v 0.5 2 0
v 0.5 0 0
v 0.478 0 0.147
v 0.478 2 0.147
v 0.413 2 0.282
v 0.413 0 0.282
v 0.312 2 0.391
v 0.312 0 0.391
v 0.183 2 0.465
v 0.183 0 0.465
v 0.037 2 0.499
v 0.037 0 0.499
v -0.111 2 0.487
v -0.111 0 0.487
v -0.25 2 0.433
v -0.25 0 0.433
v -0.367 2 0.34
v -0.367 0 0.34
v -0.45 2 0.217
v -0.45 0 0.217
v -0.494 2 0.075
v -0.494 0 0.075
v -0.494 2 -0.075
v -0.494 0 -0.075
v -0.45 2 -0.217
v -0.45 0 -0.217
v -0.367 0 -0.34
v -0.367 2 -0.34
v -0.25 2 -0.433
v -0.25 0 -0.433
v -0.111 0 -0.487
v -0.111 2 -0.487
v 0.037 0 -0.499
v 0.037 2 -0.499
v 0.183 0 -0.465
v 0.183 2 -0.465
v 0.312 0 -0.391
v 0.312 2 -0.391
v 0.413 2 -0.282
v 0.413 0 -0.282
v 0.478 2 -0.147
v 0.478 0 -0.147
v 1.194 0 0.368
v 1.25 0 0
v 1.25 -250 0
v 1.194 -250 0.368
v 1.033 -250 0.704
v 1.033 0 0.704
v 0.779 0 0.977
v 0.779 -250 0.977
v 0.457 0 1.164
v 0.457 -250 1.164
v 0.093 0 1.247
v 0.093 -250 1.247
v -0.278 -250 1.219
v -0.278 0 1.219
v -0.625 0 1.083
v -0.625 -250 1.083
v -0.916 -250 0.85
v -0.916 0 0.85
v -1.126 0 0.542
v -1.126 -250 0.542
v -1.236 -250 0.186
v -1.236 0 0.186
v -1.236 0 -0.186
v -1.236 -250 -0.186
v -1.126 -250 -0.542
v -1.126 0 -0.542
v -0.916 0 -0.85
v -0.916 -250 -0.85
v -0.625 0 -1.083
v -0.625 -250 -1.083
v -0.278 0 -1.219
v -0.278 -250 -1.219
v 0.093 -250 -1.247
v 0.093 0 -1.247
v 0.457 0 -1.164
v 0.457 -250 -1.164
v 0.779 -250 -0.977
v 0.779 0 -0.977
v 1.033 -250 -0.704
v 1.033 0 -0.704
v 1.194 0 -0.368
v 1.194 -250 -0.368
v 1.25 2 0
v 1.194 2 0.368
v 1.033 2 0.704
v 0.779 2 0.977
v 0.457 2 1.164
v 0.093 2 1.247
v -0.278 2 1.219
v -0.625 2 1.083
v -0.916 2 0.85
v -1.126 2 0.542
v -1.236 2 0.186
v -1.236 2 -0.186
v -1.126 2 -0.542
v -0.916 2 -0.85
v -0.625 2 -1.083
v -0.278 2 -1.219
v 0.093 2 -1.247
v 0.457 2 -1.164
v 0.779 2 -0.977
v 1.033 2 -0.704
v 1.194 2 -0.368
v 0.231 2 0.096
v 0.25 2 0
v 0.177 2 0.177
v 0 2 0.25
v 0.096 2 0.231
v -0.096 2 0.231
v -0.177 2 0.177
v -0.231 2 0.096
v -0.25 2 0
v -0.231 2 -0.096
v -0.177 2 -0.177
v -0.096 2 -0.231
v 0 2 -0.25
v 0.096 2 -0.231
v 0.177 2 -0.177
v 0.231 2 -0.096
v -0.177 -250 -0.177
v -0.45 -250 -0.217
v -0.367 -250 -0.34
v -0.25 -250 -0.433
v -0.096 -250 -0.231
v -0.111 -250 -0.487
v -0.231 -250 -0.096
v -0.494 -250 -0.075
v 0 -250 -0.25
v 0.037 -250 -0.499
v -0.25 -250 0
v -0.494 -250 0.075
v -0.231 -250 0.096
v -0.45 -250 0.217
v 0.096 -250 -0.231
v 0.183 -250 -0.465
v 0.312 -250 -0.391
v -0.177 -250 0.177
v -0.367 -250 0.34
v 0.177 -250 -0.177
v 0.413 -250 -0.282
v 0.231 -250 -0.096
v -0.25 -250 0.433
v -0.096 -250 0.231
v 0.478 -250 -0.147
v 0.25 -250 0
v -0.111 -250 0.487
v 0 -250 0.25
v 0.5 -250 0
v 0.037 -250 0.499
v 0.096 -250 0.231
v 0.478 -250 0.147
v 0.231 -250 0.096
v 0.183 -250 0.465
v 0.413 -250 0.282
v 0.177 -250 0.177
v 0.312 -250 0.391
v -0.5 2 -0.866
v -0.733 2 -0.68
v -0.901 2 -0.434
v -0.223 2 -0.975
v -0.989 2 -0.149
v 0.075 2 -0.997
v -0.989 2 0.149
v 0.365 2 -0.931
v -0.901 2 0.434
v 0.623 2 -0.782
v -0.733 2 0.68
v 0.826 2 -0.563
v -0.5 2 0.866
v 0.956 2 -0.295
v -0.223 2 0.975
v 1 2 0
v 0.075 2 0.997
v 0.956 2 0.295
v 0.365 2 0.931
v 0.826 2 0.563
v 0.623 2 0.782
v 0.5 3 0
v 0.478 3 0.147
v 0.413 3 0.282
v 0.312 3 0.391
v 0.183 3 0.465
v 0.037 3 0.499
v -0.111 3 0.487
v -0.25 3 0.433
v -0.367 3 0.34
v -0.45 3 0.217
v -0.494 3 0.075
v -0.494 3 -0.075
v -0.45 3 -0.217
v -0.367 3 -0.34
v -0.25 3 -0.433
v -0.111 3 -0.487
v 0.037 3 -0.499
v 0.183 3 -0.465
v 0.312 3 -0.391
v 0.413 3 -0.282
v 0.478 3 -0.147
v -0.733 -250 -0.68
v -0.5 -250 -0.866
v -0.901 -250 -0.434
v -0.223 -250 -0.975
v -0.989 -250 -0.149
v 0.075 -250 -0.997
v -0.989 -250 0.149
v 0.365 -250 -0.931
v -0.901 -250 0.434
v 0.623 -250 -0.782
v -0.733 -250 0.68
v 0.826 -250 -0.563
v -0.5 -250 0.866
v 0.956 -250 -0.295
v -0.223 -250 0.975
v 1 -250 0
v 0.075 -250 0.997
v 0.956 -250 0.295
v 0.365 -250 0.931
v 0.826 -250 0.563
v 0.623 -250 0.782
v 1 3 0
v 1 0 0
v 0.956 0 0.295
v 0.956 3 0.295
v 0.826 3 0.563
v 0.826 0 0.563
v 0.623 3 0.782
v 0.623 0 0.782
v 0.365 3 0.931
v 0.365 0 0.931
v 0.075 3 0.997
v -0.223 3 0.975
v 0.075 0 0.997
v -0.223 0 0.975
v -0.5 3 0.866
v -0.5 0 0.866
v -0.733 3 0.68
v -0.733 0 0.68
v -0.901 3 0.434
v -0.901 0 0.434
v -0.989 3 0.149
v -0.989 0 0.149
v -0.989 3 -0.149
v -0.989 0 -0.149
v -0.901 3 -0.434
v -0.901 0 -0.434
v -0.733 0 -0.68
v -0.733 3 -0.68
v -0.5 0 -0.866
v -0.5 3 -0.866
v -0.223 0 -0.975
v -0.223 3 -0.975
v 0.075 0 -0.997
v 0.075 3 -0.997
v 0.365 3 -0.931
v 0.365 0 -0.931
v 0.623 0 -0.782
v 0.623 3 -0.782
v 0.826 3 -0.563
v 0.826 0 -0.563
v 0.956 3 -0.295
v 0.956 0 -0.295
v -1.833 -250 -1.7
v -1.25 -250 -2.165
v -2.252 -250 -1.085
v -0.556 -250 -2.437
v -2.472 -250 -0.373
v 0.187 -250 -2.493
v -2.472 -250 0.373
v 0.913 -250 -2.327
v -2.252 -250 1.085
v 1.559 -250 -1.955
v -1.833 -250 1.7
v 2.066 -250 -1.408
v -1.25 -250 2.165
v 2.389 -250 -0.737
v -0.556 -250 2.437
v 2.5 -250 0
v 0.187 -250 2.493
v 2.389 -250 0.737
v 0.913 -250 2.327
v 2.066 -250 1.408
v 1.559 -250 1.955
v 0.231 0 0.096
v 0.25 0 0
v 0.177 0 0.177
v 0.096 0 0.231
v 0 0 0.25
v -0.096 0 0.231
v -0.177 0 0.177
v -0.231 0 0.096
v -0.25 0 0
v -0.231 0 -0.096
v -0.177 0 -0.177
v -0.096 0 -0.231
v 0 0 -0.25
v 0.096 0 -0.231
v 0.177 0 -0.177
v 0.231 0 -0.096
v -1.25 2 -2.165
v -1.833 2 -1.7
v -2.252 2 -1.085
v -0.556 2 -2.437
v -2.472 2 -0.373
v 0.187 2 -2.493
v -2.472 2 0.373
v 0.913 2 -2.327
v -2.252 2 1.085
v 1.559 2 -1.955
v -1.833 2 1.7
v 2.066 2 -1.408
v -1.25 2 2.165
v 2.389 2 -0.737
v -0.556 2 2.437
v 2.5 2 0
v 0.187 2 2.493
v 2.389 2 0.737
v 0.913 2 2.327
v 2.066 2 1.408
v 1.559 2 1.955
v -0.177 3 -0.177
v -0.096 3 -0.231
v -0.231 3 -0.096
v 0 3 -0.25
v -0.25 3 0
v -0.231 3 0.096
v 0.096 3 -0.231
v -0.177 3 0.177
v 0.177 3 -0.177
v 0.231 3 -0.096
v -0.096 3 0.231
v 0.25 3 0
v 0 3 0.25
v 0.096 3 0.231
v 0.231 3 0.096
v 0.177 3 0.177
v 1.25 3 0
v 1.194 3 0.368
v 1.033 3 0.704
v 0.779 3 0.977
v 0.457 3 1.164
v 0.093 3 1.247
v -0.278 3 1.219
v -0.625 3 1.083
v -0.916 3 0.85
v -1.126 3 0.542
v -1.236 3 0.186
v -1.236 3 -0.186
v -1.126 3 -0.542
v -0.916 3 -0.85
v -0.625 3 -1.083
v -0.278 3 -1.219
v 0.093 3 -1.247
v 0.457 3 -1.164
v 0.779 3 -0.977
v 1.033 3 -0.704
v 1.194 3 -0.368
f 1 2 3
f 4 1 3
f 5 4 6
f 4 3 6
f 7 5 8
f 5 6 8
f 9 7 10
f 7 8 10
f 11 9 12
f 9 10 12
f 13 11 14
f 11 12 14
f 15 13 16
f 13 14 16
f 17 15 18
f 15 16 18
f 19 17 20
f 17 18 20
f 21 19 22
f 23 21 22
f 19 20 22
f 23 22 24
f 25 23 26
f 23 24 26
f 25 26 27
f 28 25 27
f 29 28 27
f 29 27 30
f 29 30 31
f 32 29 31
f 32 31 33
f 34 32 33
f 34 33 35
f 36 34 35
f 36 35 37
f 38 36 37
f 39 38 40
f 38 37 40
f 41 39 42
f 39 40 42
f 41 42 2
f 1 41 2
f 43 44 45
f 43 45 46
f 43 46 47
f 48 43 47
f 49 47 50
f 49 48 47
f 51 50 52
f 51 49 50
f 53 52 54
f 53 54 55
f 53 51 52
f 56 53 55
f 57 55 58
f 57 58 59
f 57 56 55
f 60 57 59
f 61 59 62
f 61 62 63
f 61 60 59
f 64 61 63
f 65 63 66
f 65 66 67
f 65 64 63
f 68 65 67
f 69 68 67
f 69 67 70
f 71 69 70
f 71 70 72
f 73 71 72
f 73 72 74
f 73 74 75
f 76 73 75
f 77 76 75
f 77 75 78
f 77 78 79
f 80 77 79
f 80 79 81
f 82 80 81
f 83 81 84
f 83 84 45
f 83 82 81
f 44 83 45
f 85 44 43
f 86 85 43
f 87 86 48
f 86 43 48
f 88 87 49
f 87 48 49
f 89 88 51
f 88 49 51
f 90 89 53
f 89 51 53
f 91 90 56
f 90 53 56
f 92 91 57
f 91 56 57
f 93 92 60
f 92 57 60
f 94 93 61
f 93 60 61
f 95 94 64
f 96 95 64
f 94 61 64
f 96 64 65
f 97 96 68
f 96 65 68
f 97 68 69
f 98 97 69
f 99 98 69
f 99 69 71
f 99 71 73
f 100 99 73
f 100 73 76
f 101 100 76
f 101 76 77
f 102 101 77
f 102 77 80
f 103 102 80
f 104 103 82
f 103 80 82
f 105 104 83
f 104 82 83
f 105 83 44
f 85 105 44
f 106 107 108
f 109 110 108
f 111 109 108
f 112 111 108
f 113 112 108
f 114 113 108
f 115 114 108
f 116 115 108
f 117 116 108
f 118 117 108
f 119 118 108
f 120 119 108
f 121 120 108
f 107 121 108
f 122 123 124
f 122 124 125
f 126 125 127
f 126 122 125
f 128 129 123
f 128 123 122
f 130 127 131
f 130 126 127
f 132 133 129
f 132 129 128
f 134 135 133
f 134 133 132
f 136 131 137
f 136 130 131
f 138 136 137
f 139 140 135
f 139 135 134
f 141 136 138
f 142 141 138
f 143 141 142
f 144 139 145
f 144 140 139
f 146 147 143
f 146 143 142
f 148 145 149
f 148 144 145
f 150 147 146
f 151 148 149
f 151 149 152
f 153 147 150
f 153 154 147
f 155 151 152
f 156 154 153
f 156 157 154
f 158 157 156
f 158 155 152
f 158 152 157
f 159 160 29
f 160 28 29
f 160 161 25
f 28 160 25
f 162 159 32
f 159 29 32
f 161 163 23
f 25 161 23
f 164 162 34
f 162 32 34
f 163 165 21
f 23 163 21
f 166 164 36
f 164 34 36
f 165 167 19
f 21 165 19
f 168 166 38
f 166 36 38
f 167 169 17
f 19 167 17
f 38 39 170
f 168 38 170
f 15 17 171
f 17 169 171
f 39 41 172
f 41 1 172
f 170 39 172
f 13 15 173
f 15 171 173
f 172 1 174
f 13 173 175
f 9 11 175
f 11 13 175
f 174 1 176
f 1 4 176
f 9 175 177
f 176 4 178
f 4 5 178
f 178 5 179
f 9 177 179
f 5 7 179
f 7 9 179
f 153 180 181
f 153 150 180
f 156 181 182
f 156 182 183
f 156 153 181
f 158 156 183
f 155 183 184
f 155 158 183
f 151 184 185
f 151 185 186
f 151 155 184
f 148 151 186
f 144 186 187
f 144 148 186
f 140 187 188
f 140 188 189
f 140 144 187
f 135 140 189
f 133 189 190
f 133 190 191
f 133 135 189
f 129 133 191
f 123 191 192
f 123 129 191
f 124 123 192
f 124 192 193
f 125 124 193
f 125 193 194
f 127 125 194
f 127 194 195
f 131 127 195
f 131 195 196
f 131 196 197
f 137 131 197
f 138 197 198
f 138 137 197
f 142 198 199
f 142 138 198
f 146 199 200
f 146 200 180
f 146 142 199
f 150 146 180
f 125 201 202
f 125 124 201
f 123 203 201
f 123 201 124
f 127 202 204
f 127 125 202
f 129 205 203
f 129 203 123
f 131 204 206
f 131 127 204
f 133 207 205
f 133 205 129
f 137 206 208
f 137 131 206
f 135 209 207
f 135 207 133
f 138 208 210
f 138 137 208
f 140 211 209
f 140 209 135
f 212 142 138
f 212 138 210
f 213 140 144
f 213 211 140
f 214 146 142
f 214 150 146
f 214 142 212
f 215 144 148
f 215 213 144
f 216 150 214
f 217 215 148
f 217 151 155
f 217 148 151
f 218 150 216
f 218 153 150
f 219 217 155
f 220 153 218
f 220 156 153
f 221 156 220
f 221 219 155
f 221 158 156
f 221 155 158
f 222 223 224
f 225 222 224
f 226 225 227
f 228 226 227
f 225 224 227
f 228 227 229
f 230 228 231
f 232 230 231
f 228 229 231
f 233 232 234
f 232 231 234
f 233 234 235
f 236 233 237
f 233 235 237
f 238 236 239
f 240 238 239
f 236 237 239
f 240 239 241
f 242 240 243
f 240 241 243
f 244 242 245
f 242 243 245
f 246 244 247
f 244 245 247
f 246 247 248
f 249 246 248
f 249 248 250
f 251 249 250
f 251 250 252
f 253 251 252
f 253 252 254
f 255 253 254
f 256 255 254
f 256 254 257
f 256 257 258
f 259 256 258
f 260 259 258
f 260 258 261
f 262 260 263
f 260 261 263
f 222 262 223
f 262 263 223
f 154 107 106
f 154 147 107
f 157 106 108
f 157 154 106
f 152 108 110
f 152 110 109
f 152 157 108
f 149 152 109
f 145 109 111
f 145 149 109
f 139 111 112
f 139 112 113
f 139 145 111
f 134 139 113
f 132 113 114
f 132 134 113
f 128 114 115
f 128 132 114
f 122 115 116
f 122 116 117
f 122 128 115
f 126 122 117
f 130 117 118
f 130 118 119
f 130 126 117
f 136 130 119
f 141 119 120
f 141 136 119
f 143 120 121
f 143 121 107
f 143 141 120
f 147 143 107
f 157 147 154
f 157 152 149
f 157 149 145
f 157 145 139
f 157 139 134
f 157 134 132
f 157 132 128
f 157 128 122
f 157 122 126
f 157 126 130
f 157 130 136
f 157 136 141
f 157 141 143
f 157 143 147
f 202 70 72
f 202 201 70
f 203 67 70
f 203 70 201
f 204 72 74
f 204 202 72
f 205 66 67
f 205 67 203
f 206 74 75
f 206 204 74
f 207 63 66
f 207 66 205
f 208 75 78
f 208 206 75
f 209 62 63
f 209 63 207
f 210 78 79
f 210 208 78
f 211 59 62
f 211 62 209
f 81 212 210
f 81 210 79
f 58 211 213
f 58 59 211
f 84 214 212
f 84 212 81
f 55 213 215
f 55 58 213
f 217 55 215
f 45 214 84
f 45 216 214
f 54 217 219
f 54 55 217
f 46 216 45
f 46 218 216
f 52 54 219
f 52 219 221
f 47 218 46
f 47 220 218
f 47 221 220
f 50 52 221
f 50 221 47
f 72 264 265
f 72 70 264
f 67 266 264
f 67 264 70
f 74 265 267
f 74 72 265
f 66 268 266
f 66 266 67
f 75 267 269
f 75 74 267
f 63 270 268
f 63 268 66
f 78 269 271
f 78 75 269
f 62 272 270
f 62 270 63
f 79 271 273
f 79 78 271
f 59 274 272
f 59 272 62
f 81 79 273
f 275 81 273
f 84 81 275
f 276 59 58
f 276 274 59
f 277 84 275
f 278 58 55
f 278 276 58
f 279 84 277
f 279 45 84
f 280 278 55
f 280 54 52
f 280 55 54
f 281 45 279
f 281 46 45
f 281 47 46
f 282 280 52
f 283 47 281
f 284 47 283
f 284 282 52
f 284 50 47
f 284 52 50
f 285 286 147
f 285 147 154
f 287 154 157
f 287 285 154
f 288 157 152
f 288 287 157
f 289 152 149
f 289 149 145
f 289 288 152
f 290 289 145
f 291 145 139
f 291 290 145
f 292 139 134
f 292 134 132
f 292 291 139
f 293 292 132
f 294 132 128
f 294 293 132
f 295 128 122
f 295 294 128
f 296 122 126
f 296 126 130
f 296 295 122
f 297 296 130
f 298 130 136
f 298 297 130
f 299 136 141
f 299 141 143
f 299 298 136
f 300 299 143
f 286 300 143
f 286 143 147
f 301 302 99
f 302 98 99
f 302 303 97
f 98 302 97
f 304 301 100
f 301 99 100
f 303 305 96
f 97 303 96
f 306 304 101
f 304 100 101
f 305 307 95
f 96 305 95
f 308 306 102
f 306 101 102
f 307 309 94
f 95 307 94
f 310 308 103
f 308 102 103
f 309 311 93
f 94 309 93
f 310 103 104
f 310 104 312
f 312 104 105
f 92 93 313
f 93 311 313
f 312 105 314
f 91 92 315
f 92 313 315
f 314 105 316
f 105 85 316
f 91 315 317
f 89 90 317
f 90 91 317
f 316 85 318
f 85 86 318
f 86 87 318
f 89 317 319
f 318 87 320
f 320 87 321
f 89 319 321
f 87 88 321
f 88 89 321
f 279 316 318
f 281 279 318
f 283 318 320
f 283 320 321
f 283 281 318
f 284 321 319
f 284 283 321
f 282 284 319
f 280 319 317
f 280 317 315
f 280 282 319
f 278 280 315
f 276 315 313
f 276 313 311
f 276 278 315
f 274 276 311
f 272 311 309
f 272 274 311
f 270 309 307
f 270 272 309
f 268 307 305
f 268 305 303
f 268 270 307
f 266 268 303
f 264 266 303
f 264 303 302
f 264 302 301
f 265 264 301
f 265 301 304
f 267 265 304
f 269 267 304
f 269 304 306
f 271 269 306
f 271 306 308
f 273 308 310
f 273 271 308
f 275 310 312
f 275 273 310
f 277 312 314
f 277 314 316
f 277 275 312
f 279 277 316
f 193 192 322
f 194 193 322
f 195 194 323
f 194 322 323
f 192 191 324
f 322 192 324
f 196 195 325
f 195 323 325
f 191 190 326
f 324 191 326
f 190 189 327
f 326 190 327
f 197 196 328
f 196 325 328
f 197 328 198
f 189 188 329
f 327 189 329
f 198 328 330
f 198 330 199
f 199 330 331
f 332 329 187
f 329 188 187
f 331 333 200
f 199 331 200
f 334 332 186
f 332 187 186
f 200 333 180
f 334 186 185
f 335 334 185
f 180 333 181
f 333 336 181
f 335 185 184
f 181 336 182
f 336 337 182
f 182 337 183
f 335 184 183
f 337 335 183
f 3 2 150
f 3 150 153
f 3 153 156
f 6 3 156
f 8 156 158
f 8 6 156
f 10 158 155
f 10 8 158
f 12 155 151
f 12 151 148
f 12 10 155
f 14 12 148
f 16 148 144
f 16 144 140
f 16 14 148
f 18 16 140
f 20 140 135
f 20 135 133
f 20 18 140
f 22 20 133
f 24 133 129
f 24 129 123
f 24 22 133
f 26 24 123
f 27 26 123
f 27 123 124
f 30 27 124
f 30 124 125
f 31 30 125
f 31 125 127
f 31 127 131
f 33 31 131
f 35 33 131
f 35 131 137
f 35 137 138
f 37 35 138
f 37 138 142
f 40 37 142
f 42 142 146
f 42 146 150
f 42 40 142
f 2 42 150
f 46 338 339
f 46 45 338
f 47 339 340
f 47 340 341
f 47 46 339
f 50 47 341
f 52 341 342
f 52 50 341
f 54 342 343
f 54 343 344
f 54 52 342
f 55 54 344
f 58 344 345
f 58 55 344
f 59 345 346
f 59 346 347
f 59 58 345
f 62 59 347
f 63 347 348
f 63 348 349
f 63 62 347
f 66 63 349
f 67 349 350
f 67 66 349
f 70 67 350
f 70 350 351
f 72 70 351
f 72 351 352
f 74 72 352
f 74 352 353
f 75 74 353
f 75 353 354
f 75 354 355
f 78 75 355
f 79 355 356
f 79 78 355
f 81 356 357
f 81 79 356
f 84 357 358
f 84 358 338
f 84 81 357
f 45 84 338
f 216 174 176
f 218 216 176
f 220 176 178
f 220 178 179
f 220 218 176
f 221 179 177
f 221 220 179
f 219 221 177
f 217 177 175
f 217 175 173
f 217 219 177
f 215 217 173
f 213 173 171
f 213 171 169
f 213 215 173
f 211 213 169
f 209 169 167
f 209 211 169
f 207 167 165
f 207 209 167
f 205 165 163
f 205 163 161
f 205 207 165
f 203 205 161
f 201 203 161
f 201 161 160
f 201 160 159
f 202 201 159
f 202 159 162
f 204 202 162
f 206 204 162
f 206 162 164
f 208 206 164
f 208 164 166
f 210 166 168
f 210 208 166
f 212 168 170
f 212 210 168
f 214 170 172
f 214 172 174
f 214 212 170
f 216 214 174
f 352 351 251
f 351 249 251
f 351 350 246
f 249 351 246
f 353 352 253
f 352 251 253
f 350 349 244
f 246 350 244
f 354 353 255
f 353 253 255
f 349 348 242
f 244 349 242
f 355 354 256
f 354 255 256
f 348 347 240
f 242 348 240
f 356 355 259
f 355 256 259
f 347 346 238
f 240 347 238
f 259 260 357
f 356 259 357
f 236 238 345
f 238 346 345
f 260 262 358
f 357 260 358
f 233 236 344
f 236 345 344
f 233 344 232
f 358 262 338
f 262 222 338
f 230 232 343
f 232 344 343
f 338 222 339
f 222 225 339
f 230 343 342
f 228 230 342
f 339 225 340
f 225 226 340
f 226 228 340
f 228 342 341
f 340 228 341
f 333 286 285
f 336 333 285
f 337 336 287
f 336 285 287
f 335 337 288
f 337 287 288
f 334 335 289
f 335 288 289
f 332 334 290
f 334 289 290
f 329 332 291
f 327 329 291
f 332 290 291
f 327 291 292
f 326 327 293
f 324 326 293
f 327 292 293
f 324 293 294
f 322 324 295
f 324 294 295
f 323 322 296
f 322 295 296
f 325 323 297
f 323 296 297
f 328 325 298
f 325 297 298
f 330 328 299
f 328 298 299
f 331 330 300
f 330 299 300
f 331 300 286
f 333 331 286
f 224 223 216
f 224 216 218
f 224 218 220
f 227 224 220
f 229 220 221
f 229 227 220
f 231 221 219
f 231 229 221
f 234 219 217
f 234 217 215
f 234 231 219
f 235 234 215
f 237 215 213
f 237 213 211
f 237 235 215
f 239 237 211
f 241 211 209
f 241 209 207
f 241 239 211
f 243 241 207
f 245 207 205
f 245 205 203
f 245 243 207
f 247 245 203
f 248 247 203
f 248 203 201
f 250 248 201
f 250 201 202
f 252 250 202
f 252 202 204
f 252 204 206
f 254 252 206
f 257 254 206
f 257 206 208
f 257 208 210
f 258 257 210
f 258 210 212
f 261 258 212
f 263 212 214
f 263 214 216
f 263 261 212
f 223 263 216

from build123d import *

# Parameters (mm, degrees)
F0_R          = 2.5
F0_R_2        = 1.25
F0_R_3        = 1
F0_R_4        = 0.5
F0_R_5        = 0.25
F1_DEPTH      = 250
F1_DEPTH_BACK = 2
F2_DEPTH      = 250
F2_DEPTH_BACK = 3


with BuildPart() as f1:
    # F0 (on Front) → F1 (new body, two sides)
    with BuildSketch(Plane.XZ) as f1_sk:
        Circle(F0_R)
        Circle(F0_R_2, mode=Mode.SUBTRACT)
        Circle(F0_R_3)
        Circle(F0_R_4, mode=Mode.SUBTRACT)
        Circle(F0_R_5)
    extrude(amount=F1_DEPTH)
    extrude(f1_sk.sketch, amount=-F1_DEPTH_BACK)


with BuildPart() as f2:
    # F0 (on Front) → F2 (new body, two sides)
    with BuildSketch(Plane.XZ) as f2_sk:
        Circle(F0_R_2)
        Circle(F0_R_3, mode=Mode.SUBTRACT)
        Circle(F0_R_4)
        Circle(F0_R_5, mode=Mode.SUBTRACT)
    extrude(amount=F2_DEPTH)
    extrude(f2_sk.sketch, amount=-F2_DEPTH_BACK)


solid = Compound([f1.part, f2.part])
